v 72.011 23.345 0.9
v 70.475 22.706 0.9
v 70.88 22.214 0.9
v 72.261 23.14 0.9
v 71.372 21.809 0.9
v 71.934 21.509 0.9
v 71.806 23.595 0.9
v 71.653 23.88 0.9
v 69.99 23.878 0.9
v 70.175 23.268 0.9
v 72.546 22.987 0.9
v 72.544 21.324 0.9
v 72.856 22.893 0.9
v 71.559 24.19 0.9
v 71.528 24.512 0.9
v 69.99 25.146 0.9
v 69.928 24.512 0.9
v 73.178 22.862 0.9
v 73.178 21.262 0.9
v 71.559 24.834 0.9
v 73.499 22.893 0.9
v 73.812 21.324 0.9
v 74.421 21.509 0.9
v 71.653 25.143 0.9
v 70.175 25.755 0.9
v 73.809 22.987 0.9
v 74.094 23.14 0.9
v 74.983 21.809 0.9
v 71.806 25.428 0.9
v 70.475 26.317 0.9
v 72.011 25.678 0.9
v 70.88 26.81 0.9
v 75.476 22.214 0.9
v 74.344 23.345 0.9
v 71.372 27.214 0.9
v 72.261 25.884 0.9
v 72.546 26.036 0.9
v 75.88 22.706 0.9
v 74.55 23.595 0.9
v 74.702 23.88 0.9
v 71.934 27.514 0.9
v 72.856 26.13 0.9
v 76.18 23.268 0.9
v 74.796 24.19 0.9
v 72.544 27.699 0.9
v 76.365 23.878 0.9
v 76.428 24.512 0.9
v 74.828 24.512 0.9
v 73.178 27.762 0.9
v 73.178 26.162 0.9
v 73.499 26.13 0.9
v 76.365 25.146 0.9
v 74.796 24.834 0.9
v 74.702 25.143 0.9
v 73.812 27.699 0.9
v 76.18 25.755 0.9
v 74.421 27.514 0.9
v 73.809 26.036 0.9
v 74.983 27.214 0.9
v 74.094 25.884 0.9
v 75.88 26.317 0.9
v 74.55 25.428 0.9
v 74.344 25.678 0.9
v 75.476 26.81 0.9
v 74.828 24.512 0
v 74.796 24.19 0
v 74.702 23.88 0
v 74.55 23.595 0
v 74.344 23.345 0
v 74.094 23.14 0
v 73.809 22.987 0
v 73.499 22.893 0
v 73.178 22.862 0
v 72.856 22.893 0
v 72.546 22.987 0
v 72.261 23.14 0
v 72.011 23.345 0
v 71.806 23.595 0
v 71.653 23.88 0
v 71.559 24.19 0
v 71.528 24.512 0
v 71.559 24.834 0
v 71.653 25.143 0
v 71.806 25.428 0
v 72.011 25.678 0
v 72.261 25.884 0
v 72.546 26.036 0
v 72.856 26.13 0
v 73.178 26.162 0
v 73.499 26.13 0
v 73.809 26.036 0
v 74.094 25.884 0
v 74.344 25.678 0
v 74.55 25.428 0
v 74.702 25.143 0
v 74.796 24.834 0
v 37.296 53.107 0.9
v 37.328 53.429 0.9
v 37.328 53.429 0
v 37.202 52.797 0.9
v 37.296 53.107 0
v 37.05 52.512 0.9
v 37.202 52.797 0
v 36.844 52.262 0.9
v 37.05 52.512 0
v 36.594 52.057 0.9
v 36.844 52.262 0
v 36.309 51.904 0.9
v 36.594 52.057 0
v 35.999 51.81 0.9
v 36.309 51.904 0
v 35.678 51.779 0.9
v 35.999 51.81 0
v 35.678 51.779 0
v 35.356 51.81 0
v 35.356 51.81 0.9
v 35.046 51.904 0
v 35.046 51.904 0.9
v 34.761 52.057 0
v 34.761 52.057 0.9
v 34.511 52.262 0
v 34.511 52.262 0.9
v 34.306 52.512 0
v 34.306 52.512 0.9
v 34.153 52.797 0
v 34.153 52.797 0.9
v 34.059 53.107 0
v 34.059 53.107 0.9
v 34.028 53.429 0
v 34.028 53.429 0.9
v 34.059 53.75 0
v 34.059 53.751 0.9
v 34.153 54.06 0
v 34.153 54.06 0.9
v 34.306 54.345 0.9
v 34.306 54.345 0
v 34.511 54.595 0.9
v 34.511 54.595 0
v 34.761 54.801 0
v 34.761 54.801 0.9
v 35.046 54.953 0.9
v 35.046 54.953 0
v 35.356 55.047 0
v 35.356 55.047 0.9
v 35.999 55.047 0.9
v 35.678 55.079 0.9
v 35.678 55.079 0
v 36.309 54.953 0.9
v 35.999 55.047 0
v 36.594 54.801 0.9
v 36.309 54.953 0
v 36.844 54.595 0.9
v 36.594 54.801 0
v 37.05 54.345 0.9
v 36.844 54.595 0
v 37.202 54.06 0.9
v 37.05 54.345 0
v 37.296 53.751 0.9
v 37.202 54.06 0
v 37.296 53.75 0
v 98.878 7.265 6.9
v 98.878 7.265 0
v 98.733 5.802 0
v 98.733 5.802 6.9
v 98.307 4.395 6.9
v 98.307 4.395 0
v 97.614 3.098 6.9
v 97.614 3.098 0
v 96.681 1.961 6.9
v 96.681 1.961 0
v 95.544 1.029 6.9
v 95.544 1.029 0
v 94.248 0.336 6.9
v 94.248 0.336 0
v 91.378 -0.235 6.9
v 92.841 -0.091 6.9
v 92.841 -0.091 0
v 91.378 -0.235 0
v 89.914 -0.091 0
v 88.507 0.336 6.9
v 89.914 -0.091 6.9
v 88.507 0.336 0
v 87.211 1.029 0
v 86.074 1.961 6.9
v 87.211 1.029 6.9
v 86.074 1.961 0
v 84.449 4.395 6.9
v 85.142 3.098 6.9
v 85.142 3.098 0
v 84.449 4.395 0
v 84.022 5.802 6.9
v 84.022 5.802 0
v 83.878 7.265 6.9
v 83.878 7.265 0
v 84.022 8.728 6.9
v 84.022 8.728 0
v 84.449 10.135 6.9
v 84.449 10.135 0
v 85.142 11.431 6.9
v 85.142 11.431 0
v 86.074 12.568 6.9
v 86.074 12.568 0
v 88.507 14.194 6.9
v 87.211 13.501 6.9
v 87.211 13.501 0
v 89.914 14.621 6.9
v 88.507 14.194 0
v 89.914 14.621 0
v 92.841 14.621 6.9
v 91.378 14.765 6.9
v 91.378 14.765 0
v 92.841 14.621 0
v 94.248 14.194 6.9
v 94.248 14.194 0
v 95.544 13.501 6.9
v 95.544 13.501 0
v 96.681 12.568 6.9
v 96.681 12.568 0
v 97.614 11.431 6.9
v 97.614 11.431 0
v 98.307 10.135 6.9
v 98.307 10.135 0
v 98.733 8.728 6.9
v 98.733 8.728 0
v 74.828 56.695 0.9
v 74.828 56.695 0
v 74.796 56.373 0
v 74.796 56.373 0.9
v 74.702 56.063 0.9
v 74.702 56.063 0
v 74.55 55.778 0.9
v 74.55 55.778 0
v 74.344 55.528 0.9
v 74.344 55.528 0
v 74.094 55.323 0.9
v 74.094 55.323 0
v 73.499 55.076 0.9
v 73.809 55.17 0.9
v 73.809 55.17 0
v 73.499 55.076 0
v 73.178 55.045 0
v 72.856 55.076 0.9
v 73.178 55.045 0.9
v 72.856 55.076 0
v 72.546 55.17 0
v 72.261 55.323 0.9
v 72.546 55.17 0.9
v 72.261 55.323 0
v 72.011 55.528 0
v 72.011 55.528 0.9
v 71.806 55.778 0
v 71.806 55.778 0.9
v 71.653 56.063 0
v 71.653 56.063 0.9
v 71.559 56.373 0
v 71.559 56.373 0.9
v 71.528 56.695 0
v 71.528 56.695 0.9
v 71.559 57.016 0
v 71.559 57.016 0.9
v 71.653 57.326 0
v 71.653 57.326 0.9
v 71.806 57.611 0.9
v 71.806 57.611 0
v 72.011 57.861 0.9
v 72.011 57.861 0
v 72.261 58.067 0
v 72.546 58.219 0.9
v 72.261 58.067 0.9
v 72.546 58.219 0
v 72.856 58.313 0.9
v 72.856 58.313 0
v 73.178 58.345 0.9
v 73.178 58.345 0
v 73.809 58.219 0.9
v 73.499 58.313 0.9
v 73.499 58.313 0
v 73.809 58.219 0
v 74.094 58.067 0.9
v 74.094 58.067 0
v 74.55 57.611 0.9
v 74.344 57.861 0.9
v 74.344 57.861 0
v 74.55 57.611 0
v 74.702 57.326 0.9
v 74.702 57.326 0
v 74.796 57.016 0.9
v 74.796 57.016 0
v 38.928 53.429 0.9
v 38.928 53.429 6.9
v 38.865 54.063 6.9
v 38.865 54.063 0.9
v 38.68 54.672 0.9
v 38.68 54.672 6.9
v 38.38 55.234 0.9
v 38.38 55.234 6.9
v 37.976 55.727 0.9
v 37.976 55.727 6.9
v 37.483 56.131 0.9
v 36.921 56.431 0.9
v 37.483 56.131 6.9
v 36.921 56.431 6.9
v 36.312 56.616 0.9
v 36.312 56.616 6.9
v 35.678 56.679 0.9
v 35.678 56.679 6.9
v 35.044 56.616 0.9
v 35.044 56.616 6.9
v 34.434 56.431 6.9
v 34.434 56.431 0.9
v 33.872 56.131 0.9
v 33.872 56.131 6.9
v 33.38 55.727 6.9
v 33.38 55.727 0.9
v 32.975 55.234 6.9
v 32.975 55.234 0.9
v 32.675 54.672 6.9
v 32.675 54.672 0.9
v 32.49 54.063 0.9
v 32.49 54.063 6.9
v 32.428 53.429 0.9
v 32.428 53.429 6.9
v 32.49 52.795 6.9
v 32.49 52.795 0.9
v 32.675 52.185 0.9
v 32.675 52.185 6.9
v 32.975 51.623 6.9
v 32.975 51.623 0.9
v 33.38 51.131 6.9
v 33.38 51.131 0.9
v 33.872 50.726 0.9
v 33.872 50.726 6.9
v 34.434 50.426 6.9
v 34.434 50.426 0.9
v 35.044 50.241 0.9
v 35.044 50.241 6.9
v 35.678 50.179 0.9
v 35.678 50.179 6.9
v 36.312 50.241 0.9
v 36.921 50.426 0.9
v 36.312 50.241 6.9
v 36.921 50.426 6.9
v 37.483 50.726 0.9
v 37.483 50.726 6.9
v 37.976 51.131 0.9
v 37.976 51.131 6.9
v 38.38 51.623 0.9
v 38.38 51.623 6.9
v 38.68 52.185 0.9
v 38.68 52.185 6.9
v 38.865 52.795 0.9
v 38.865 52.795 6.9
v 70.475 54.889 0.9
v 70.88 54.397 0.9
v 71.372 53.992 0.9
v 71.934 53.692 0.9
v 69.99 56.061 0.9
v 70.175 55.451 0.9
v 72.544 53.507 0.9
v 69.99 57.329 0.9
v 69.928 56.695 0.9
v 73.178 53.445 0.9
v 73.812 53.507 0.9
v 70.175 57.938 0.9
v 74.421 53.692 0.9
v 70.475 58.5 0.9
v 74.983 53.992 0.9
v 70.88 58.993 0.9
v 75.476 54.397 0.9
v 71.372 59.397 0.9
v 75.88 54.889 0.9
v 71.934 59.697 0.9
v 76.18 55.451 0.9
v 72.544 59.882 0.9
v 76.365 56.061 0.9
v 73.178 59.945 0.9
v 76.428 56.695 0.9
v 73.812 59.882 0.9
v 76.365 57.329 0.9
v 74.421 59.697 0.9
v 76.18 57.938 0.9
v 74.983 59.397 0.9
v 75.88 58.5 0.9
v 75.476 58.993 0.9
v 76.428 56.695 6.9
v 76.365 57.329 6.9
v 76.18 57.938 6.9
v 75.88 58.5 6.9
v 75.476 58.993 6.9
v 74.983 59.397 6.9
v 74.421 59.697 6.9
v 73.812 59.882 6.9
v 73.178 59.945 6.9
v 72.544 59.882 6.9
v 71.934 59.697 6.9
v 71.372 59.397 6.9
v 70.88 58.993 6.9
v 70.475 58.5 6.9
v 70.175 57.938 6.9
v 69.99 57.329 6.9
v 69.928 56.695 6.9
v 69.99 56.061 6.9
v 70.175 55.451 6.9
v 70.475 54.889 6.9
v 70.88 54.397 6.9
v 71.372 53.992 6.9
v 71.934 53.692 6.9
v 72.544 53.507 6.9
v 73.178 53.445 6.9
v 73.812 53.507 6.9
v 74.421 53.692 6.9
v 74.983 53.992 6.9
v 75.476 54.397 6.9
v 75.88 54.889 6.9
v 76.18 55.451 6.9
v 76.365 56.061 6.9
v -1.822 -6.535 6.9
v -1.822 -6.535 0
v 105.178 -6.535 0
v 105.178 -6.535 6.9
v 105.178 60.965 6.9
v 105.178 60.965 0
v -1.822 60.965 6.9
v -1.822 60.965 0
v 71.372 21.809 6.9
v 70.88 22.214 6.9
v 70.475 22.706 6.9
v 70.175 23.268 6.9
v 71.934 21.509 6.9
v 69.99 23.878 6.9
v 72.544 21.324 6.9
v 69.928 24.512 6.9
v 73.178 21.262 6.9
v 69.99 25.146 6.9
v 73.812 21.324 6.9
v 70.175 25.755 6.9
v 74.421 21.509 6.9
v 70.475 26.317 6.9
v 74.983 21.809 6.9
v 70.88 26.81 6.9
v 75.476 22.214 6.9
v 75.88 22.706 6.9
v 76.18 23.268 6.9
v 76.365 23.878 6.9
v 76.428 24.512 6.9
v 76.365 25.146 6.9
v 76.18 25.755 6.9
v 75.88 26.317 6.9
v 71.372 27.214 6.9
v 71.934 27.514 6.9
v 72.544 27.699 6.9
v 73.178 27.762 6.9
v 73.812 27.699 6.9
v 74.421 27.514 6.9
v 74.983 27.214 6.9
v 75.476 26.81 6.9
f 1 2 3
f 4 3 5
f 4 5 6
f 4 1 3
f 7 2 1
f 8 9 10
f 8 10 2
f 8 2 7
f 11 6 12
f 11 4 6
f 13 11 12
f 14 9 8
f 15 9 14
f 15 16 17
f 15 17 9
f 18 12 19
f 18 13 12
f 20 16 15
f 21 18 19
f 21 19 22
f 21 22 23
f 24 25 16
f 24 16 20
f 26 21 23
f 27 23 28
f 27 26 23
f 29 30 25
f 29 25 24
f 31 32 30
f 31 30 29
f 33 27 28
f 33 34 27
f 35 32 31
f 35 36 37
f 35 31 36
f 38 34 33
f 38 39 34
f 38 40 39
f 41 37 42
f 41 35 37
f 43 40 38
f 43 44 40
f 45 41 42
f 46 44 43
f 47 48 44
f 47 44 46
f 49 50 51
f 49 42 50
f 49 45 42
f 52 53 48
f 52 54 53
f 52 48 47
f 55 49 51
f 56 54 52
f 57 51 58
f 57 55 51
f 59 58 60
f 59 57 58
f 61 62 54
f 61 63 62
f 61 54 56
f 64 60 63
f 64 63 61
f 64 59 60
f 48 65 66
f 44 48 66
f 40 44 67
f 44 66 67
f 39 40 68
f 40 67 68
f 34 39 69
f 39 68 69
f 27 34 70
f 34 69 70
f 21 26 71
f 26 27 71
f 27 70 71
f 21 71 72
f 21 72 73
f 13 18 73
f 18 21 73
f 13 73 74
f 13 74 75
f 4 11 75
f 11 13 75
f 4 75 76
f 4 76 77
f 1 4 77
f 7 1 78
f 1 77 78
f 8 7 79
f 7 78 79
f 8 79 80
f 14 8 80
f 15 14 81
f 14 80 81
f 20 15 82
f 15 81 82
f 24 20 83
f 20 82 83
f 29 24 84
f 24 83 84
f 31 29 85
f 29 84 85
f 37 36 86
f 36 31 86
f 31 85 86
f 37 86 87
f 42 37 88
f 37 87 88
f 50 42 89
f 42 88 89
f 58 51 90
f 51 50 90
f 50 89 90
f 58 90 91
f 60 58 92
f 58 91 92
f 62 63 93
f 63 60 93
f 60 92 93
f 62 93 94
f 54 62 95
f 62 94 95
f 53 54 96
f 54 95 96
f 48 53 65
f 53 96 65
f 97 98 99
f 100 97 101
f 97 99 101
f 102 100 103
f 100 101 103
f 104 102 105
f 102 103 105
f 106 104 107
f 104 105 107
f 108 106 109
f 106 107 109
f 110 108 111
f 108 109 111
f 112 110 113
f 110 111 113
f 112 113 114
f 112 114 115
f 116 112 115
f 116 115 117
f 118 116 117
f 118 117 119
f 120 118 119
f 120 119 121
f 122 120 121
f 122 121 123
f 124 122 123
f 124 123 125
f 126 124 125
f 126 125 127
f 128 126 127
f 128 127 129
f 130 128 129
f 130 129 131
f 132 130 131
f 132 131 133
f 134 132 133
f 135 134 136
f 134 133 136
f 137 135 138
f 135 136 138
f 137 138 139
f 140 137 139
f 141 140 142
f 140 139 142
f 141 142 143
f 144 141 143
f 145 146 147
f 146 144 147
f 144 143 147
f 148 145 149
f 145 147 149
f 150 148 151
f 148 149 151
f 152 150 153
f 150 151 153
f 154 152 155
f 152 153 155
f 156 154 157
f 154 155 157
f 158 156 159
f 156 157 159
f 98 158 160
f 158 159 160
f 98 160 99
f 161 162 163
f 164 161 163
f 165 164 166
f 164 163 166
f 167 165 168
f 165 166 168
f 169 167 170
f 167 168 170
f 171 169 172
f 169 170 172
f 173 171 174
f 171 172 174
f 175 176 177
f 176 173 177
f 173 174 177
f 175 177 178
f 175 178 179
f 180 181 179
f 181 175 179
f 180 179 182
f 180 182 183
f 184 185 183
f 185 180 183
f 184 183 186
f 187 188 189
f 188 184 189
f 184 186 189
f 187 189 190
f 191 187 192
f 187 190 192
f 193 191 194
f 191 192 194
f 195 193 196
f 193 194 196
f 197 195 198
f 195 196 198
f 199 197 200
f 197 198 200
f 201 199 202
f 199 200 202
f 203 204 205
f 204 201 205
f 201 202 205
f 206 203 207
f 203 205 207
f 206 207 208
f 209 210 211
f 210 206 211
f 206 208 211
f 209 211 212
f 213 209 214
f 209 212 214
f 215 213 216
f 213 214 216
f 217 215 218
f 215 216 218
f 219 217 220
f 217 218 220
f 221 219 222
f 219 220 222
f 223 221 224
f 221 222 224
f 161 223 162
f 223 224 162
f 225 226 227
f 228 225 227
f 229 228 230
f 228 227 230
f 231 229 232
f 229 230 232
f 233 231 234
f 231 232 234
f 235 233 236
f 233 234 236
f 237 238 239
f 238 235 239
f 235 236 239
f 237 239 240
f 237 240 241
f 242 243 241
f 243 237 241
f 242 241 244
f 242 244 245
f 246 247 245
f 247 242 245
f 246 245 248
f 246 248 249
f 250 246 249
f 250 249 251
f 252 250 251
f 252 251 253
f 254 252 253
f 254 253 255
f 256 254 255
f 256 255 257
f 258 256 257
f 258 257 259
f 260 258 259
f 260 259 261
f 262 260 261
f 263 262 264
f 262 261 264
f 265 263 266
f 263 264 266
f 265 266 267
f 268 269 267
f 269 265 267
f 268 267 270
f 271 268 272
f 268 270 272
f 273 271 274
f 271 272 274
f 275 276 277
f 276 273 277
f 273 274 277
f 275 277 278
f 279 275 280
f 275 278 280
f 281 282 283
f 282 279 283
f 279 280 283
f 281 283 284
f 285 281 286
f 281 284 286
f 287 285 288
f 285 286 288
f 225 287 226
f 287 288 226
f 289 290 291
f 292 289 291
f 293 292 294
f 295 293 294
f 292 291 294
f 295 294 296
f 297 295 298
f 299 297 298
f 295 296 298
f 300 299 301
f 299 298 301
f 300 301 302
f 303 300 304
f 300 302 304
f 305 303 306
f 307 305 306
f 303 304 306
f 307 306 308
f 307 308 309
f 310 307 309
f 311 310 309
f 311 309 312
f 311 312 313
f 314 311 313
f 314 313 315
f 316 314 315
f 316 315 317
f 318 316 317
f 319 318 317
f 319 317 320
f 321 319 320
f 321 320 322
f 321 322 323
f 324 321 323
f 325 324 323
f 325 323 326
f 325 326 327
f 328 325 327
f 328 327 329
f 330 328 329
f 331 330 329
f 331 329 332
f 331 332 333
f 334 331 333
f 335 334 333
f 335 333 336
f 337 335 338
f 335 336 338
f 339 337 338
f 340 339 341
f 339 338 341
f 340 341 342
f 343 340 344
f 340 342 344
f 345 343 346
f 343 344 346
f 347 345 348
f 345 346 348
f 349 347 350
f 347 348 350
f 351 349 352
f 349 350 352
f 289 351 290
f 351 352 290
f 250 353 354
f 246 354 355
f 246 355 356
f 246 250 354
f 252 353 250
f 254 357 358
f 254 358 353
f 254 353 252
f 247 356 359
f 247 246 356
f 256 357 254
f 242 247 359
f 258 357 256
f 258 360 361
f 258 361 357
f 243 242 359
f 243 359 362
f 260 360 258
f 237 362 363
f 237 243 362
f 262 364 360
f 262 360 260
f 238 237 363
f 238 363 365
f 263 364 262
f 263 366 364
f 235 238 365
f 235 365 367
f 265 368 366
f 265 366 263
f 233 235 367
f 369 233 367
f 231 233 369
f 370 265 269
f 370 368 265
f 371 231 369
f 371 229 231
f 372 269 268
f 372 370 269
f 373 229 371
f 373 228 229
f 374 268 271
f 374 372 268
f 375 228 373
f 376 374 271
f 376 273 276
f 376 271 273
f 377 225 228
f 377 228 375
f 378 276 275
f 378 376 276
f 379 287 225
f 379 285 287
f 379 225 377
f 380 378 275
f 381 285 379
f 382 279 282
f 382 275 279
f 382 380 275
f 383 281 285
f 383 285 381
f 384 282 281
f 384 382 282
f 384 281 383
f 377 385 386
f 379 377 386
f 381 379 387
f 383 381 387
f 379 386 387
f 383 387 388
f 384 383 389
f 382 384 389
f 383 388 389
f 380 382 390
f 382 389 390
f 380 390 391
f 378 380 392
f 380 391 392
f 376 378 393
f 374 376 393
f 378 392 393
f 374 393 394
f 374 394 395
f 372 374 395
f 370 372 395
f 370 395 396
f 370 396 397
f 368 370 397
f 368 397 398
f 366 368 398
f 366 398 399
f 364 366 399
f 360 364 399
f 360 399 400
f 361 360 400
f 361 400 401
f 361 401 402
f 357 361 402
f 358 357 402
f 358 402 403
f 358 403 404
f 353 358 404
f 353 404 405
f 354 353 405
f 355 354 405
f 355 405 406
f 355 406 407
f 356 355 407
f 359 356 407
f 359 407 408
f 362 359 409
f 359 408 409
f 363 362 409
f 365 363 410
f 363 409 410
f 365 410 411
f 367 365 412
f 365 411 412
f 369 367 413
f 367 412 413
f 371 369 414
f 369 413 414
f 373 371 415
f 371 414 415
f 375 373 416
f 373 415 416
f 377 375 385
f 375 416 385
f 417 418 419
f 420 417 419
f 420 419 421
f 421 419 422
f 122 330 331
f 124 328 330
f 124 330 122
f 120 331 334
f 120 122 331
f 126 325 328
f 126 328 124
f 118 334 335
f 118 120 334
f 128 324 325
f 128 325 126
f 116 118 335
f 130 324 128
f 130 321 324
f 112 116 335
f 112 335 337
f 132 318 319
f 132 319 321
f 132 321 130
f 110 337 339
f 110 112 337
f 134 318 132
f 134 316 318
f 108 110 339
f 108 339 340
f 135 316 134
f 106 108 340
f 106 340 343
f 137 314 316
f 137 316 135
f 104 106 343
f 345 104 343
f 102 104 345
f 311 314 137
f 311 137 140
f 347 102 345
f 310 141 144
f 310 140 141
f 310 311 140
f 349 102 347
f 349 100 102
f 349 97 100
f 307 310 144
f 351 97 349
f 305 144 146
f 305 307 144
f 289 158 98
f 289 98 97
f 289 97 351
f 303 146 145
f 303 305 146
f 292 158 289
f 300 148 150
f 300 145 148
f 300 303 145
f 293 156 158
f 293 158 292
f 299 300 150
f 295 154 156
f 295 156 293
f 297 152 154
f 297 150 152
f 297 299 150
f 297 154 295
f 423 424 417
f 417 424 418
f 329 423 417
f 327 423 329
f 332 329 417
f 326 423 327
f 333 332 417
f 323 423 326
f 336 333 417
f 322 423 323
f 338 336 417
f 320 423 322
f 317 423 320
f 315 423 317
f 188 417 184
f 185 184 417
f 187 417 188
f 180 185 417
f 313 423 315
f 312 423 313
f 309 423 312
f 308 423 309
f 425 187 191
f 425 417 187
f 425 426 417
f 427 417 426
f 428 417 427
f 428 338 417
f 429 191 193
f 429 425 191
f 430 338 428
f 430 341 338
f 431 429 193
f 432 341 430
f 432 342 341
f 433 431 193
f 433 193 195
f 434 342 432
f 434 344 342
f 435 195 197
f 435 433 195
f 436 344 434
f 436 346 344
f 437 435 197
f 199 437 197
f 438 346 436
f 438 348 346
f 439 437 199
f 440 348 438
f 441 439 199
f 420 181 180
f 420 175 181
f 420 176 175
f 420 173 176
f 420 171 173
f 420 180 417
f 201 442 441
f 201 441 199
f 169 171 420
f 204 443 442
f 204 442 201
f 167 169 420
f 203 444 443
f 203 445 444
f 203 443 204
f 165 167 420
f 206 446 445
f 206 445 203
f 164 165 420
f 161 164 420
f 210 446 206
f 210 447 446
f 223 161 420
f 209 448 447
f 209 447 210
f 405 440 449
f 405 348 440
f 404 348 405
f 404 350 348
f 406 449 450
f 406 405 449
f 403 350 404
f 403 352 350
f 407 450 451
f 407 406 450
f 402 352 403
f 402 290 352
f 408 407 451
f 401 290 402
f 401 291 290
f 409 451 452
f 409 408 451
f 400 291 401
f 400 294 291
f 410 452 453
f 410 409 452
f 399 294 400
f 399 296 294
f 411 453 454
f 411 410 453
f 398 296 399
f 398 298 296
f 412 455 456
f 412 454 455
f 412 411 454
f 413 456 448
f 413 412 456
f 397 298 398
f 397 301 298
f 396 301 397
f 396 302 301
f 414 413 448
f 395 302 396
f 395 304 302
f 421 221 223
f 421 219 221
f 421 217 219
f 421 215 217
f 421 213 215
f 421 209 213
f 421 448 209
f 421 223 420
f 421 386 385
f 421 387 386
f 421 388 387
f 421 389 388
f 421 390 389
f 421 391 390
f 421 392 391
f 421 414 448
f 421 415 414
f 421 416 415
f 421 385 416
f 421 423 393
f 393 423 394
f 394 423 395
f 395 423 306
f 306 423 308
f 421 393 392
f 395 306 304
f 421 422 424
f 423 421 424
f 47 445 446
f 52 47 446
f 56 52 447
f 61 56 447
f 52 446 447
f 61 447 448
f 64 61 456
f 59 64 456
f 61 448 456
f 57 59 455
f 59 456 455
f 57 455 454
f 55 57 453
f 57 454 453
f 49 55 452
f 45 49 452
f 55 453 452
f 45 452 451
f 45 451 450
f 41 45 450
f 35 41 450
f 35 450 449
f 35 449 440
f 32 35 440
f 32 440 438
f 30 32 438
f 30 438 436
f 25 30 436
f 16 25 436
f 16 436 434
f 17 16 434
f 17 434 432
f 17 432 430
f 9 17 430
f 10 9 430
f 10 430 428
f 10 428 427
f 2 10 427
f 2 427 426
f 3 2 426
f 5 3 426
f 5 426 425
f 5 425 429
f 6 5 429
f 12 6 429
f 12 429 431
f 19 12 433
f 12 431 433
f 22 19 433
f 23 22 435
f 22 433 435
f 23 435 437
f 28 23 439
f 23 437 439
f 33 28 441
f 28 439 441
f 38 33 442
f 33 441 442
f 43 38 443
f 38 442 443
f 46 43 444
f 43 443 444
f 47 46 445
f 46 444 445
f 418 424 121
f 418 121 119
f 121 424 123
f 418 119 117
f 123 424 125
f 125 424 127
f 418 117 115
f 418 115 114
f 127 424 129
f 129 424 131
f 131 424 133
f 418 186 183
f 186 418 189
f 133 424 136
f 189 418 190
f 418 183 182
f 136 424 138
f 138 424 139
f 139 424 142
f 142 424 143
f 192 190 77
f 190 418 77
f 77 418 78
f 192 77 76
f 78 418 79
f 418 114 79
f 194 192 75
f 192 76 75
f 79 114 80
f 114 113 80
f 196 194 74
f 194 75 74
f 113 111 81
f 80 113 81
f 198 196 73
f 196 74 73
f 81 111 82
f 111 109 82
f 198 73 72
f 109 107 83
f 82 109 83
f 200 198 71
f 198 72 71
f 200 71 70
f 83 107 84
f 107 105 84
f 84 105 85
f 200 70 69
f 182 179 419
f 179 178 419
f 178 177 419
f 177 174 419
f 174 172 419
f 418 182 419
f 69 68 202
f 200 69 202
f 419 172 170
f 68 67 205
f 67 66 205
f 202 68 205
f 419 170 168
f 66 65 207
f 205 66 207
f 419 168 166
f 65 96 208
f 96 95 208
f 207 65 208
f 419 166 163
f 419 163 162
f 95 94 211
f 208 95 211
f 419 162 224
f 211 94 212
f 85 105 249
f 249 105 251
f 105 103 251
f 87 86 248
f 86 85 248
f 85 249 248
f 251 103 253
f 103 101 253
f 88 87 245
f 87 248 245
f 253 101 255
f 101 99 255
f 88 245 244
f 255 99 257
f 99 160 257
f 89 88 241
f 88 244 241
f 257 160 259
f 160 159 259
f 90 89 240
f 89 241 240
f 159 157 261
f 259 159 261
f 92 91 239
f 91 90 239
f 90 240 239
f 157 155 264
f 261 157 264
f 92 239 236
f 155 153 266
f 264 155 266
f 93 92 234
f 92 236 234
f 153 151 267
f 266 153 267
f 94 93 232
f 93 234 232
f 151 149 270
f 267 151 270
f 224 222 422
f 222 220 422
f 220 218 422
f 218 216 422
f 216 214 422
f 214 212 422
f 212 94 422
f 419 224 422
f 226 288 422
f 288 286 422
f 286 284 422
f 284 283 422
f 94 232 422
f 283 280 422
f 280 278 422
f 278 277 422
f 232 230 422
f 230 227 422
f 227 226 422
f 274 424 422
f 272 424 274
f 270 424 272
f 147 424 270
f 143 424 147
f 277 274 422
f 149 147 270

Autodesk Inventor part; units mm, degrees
ref_plane "YZ Plane" through (0, 0, 0) normal (1, 0, 0) x (0, 1, 0)
ref_plane "XZ Plane" through (0, 0, 0) normal (0, 1, 0) x (-1, 0, 0)
ref_plane "Work Plane1" through (0, 0, 0) normal (0, 0, 1) x (1, 0, 0)
sketch "Sketch1" plane through (0, 0, 0) normal (0, 0, 1) x (1, 0, 0)
  circle A0 centre (35.6776, 53.4286) radius 1.65 construction
  circle A1 centre (91.3776, 7.2647) radius 7.5 construction
  circle A2 centre (73.1776, 24.5117) radius 1.65 construction
  circle A3 centre (73.1776, 56.6946) radius 1.65 construction
  circle A4 centre (75.9087, -63.7578) radius 1.65 construction
  circle A5 centre (1.8224, -63.7578) radius 1.65 construction
  line L0 (105.1776, 60.9647) -> (-1.8224, 60.9647) construction
  line L1 (-1.8224, 60.9647) -> (-1.8224, -66.5509) construction
  line L2 (-1.8224, -66.5509) -> (78.1776, -66.5509) construction
  line L3 (78.1776, -66.5509) -> (78.1776, -30.5509) construction
  line L4 (78.1776, -30.5509) -> (105.1776, -30.5509) construction
  line L5 (105.1776, -30.5509) -> (105.1776, 60.9647) construction
  line L6 (105.1776, 60.9647) -> (-1.8224, 60.9647)
  line L7 (-1.8224, 60.9647) -> (-1.8224, -6.5353)
  line L8 (-1.8224, -6.5353) -> (105.1776, -6.5353)
  line L9 (105.1776, -6.5353) -> (105.1776, 60.9647)
  circle A6 centre (91.3776, 7.2647) radius 7.5
  circle A7 centre (73.1776, 56.6946) radius 1.65 projected
  circle A8 centre (73.1776, 24.5117) radius 1.65 projected
  circle A9 centre (35.6776, 53.4286) radius 1.65 projected
  point P0 (0, 0)
  dimension "d0" = 13.8
ref_plane "Work Plane2" through (-44.4224, -5.9353, 6.9) normal (0, 0, -1) x (0, 1, 0)
extrude "Extrusion1" add sketch "Sketch1" along normal up to surface (6.9 mm away)
sketch "Sketch2" plane through (-1.8224, 60.9647, 6.9) normal (0, 0, 1) x (1, 0, 0)
  circle A0 centre (37.5, -7.536) radius 1.65 projected
  circle A1 centre (75, -4.2701) radius 1.65 projected
  circle A2 centre (75, -36.453) radius 1.65 projected
  circle A3 centre (75, -4.2701) radius 3.25
  circle A4 centre (37.5, -7.536) radius 3.25
  circle A5 centre (75, -36.453) radius 3.25
  point P0 (1.8224, -60.9647)
  dimension "d3" = 6.5
  dimension "d4" = 6.5
  dimension "d5" = 6.5
extrude "Extrusion2" cut sketch "Sketch2" against normal blind 6
properties part number "10_MiniSPIM_Smarthponebase"
